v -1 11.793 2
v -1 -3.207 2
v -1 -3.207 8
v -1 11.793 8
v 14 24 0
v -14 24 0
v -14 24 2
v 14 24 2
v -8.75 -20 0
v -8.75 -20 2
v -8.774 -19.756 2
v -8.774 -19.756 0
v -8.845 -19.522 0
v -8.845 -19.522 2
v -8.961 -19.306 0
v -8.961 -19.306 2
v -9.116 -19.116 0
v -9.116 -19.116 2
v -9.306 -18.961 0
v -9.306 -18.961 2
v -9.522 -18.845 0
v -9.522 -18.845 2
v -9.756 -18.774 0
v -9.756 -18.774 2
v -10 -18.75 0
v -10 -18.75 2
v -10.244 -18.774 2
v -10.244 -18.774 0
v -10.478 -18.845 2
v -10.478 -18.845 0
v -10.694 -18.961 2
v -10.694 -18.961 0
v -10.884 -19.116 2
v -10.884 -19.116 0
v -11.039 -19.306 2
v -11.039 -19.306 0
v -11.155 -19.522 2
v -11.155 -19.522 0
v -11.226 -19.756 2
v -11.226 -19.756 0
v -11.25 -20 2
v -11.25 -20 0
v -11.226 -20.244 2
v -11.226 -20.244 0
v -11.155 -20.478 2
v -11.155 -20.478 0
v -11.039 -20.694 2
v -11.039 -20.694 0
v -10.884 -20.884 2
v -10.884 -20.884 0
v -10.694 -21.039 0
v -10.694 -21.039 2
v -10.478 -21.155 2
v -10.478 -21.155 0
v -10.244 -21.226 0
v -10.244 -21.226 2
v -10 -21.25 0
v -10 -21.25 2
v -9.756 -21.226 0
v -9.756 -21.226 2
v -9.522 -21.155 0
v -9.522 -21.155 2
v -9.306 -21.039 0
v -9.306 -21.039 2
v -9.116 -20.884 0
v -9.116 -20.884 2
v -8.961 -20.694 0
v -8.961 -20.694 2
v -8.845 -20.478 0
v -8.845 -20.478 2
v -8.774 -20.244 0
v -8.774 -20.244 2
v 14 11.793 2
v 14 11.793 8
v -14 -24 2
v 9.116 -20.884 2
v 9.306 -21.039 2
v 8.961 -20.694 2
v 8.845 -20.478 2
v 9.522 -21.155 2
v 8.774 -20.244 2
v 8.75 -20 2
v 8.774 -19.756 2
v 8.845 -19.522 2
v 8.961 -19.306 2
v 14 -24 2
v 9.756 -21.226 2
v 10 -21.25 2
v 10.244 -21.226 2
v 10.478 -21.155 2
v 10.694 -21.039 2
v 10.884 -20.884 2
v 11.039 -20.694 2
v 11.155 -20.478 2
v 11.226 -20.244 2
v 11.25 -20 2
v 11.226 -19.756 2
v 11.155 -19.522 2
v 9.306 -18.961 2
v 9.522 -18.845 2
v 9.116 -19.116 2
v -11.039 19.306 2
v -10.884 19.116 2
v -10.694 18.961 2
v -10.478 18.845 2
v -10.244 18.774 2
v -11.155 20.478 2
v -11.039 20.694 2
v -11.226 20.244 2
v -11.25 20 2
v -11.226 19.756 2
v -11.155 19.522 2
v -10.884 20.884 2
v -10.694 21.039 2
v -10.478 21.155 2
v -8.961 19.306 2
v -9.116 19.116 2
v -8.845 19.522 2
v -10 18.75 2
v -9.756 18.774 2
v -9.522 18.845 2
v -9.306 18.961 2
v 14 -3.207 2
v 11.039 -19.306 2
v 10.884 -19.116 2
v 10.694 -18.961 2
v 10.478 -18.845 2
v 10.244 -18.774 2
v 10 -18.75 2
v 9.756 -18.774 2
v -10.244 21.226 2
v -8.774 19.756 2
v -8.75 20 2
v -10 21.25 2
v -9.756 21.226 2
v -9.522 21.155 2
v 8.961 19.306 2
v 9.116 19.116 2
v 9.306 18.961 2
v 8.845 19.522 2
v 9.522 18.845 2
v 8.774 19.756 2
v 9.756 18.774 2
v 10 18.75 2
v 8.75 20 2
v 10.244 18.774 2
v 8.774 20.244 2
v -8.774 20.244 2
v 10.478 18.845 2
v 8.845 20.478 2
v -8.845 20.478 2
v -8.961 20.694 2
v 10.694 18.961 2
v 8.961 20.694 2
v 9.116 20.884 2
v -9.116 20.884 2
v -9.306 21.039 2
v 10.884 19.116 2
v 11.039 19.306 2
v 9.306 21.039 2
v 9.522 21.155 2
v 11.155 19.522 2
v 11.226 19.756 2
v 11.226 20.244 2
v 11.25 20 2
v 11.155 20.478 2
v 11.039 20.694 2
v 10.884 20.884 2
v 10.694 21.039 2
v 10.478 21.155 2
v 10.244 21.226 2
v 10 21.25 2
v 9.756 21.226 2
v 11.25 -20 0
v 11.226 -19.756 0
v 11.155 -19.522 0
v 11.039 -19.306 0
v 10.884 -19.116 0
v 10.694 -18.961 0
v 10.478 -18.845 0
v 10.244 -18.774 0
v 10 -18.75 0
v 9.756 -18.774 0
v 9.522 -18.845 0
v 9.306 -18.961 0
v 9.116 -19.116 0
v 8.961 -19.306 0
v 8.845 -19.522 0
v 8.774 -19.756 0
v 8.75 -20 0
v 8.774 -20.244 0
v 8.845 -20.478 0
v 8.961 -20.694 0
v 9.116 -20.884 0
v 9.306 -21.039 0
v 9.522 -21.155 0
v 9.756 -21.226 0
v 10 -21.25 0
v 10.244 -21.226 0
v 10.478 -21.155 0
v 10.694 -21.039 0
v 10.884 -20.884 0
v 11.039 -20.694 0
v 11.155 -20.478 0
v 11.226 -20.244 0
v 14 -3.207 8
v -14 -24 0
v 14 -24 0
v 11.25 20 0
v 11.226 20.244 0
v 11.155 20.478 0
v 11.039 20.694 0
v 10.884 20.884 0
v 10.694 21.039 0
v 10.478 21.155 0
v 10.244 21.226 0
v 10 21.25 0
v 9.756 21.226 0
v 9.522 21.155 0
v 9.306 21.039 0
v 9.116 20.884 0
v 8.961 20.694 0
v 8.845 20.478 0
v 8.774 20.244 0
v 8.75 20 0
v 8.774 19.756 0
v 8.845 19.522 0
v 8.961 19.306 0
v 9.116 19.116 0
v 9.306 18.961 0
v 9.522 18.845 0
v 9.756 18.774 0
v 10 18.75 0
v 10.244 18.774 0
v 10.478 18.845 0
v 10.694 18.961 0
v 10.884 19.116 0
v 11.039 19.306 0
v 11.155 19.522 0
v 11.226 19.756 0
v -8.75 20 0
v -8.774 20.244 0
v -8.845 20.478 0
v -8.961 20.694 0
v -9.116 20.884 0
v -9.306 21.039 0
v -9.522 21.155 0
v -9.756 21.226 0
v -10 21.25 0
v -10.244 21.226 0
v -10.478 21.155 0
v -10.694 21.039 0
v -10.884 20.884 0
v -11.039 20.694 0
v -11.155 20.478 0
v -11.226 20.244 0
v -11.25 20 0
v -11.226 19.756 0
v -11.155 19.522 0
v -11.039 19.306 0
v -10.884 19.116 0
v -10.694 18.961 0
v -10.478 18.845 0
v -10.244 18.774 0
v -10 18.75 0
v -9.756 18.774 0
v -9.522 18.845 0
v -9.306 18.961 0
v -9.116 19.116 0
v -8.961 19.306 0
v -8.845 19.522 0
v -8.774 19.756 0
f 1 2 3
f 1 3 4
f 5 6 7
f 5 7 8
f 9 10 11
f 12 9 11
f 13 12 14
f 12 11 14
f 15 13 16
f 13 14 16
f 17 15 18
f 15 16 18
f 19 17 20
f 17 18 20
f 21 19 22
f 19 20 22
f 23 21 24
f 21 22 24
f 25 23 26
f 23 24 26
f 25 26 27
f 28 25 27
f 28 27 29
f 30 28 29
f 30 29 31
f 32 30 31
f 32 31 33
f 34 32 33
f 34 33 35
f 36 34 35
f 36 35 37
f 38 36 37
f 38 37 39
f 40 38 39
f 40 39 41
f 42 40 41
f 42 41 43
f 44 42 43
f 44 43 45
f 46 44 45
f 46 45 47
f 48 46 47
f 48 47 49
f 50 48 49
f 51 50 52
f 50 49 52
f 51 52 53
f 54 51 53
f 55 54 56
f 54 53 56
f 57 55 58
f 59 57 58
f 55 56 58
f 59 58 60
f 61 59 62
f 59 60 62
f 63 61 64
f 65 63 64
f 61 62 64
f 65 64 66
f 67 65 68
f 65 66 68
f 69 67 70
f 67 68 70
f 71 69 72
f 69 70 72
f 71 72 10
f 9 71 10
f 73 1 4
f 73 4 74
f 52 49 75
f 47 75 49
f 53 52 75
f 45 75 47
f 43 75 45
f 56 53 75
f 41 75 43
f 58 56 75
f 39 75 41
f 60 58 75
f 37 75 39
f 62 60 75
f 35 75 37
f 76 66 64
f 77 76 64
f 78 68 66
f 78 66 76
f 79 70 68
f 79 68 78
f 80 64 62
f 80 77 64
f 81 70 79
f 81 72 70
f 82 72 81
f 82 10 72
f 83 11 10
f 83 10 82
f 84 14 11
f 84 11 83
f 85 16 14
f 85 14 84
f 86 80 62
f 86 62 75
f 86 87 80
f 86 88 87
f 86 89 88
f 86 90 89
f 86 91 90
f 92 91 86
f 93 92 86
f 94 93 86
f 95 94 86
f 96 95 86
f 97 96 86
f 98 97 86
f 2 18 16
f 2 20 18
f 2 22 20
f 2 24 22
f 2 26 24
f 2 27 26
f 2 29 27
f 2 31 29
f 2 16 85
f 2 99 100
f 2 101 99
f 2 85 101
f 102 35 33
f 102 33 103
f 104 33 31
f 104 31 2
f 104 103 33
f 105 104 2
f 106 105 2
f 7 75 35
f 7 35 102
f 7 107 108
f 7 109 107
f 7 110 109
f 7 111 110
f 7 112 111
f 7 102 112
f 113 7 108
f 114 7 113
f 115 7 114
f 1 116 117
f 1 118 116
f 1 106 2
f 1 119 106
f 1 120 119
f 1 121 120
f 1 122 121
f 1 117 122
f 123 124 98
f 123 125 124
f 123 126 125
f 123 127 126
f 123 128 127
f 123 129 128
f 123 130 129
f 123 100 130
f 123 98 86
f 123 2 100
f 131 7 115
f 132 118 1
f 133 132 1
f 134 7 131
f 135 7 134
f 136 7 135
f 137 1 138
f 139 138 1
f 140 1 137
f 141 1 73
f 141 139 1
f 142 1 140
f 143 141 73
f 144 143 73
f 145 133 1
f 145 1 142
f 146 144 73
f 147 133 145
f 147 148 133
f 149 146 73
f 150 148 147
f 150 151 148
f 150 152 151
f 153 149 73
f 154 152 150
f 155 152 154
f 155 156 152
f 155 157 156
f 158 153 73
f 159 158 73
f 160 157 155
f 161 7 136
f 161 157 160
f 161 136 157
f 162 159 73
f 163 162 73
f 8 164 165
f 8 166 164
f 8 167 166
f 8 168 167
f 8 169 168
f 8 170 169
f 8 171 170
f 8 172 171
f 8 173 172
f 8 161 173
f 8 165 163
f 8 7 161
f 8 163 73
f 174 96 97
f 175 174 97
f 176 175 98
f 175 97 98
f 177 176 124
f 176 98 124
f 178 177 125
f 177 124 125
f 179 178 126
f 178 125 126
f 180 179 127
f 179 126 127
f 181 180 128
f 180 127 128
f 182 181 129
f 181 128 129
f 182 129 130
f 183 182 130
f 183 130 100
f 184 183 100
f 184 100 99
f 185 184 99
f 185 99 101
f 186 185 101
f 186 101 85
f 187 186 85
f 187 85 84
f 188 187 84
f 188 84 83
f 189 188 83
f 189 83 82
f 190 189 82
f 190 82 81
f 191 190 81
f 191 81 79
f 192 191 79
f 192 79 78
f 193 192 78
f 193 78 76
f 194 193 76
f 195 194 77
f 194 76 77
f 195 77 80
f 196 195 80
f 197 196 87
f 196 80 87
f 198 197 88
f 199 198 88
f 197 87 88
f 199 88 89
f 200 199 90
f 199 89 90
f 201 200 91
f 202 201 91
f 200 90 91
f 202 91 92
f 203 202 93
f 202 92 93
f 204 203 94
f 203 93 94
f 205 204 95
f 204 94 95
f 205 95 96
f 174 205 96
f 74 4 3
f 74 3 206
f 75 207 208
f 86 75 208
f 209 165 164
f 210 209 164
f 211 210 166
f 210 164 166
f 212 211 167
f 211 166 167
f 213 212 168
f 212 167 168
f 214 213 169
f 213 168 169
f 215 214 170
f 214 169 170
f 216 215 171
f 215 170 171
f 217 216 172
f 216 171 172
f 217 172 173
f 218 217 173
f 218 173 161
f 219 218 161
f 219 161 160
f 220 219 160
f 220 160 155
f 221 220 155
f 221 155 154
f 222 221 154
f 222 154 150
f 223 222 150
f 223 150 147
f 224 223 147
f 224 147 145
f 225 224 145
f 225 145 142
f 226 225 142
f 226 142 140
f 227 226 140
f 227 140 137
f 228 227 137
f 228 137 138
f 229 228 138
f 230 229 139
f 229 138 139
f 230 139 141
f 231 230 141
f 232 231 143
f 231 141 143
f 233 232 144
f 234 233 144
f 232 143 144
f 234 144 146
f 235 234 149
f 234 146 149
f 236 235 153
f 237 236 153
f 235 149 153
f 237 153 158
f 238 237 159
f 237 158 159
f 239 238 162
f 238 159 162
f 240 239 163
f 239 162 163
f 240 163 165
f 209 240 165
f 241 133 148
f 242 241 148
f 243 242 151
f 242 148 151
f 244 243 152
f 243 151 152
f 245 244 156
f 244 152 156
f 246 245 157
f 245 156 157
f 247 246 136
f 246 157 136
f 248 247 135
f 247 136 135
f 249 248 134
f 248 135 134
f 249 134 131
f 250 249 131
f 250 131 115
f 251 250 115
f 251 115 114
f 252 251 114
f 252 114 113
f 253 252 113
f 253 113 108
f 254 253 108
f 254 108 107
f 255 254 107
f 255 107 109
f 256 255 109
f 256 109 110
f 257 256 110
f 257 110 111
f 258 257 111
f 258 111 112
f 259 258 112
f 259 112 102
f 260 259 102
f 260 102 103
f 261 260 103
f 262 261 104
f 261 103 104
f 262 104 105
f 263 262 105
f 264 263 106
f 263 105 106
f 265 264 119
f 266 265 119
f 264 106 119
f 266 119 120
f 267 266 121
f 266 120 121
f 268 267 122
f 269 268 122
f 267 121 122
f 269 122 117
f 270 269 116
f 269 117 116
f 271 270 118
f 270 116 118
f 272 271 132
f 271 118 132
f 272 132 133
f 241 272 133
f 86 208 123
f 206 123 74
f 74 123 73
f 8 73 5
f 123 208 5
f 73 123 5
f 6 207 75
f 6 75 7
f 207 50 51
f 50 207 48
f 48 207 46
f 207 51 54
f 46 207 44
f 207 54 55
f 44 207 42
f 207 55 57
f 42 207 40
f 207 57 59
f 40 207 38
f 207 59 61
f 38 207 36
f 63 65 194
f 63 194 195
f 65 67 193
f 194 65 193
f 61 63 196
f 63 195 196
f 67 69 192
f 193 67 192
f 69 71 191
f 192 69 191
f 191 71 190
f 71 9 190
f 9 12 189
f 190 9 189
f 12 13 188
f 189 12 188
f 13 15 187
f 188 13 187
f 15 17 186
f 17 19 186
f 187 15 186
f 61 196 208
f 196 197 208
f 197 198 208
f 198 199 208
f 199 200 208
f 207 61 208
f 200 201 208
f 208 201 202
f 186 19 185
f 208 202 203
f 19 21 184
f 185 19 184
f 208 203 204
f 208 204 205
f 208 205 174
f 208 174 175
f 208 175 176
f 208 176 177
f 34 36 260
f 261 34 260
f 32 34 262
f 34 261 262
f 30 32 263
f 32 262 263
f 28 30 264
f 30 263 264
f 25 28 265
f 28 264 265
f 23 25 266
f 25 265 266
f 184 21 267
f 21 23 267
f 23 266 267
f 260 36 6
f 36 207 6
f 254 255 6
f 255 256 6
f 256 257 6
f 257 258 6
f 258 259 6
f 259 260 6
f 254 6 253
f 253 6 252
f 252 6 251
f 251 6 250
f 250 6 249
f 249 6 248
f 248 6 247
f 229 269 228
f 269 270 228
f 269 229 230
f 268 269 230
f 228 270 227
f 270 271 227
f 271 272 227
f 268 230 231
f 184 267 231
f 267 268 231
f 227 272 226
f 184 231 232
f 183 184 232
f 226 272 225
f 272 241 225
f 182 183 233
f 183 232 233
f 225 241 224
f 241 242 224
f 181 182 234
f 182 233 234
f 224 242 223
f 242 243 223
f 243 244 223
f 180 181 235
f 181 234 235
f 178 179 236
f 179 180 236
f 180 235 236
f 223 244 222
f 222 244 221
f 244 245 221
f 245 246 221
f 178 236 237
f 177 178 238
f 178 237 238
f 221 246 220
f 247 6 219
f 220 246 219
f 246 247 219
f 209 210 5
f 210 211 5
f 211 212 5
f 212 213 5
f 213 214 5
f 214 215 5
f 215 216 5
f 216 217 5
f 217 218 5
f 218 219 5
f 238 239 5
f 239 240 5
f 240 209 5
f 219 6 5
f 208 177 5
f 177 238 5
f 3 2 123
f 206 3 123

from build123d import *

# Parameters (mm, degrees)
CROQUIS1_W              = 28
CROQUIS1_H              = 48
SALIENTE_EXTRUIR1_DEPTH = 2
CROQUIS2_R              = 1.25
CORTAR_EXTRUIR1_DEPTH   = 3
CROQUIS3_W              = 15
CROQUIS3_H              = 15
SALIENTE_EXTRUIR2_DEPTH = 6


with BuildPart() as part:
    # Croquis1 → Saliente-Extruir1 (new body)
    with BuildSketch(Plane.XY):
        Rectangle(CROQUIS1_W, CROQUIS1_H)
    extrude(amount=SALIENTE_EXTRUIR1_DEPTH)

    # Croquis2 → Cortar-Extruir1 (cut, through all)
    with BuildSketch(Plane.XY.offset(2)):
        with Locations((-10, 20)):
            Circle(CROQUIS2_R)
        with Locations((10, 20)):
            Circle(CROQUIS2_R)
        with Locations((10, -20)):
            Circle(CROQUIS2_R)
        with Locations((-10, -20)):
            Circle(CROQUIS2_R)
    extrude(amount=-CORTAR_EXTRUIR1_DEPTH, mode=Mode.SUBTRACT)

    # Croquis3 → Saliente-Extruir2 (add)
    with BuildSketch(Plane.XY.offset(2)):
        with Locations((6.5, 4.293122568)):
            Rectangle(CROQUIS3_W, CROQUIS3_H)
    extrude(amount=SALIENTE_EXTRUIR2_DEPTH)


solid = part.part
